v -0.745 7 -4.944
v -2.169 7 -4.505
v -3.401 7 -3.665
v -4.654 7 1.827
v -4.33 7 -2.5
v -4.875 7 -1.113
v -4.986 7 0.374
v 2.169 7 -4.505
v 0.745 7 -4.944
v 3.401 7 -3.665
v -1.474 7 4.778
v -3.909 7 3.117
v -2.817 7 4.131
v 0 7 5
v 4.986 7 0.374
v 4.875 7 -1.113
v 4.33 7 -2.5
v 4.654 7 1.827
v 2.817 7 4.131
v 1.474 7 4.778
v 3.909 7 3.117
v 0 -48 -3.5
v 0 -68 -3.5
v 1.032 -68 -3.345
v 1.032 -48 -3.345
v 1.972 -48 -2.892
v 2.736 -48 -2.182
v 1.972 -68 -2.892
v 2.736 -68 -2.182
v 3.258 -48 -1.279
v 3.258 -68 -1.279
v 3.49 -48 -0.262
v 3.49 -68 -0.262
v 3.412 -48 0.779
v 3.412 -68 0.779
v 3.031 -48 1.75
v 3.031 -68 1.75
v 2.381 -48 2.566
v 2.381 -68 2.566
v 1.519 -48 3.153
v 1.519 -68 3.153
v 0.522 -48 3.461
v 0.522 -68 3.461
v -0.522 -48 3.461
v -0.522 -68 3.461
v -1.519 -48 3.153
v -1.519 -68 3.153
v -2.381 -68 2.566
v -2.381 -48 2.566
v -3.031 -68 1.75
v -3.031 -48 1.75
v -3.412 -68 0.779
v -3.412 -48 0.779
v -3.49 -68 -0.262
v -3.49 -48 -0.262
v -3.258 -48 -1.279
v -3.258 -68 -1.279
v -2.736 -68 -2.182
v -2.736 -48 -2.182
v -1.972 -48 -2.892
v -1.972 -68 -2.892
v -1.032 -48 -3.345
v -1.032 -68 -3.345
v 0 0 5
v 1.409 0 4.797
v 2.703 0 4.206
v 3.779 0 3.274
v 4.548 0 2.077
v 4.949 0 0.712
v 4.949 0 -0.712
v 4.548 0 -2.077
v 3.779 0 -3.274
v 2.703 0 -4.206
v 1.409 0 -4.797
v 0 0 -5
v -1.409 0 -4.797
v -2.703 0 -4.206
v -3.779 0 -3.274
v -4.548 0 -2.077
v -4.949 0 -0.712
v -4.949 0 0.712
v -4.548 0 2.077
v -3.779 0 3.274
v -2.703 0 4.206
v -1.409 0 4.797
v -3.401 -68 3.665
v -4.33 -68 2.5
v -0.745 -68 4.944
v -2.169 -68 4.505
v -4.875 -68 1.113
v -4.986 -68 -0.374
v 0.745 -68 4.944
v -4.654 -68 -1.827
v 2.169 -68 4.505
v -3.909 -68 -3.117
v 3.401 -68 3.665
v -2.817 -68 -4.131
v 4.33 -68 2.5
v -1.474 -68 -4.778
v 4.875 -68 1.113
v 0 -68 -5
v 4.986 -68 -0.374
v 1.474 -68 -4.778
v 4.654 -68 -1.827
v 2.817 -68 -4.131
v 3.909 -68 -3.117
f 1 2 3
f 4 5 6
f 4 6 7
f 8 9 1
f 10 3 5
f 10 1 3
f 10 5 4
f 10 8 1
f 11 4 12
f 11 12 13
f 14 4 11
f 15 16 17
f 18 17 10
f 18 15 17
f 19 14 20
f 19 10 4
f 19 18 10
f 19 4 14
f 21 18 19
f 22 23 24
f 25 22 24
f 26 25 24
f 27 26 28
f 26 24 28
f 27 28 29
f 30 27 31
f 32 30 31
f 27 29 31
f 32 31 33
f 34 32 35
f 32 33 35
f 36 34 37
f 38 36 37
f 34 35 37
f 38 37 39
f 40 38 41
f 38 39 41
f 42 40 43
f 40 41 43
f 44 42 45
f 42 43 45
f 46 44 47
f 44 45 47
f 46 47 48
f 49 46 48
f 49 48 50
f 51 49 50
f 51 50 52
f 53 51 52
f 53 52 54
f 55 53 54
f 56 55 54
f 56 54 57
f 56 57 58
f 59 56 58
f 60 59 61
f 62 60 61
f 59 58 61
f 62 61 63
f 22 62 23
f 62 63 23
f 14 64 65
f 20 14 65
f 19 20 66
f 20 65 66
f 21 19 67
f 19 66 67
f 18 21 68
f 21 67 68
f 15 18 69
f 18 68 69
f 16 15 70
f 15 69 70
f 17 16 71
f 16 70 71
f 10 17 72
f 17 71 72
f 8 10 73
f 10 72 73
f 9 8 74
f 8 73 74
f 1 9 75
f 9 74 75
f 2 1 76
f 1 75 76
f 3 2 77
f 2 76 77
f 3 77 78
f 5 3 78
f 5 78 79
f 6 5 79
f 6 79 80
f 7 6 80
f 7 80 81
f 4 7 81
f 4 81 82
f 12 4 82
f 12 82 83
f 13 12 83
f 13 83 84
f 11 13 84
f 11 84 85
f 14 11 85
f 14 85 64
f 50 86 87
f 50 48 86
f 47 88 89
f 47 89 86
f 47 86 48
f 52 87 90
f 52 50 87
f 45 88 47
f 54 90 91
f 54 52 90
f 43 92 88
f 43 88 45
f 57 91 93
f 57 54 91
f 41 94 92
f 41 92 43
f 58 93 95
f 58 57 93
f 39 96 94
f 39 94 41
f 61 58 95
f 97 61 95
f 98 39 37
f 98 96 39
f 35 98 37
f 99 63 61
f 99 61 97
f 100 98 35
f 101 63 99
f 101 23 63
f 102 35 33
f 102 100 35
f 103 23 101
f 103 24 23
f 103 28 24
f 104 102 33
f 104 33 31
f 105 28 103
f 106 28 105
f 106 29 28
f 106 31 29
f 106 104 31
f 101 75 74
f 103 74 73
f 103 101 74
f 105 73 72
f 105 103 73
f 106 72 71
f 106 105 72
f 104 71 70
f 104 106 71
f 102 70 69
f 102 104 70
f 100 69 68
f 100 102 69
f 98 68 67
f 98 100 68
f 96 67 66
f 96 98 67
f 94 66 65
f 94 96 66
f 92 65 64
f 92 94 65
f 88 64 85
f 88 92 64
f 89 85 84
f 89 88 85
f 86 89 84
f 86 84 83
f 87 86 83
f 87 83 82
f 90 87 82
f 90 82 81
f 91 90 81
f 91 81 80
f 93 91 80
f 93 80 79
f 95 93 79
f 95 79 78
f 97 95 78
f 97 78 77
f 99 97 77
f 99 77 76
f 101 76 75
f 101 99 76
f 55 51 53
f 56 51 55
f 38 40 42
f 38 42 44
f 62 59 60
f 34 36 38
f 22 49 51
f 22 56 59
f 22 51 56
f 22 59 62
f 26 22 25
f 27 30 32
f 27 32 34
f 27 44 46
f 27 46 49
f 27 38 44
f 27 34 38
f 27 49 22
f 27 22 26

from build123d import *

# Parameters (mm, degrees)
SKETCH_1_R          = 5
EXTRUDE_1_DEPTH     = 7
EXTRUDE_START       = 68
SKETCH_2_R          = 5
EXTRUDE_2_DEPTH     = 68
SKETCH_3_R          = 3.5
CUT_EXTRUDE_1_DEPTH = 20


with BuildPart() as part:
    # ｽｹｯﾁ1 → ﾎﾞｽ - 押し出し1 (new body)
    with BuildSketch(Plane(origin=(0, 0, 0), x_dir=(1, 0, 0), z_dir=(0, 1, 0))):
        with Locations(Location((0, 0, 0), (0, 0, 270))):
            Circle(SKETCH_1_R)
    extrude(amount=EXTRUDE_1_DEPTH)

    # ｽｹｯﾁ2 → ﾎﾞｽ - 押し出し2 (add)
    with BuildSketch(Plane.XZ.offset(EXTRUDE_START)):
        with Locations(Location((0, 0, 0), (0, 0, 270))):
            Circle(SKETCH_2_R)
    extrude(amount=-EXTRUDE_2_DEPTH)

    # ｽｹｯﾁ3 → ｶｯﾄ - 押し出し1 (cut)
    with BuildSketch(Plane.XZ.offset(68)):
        with Locations(Location((0, 0, 0), (0, 0, 270))):
            Circle(SKETCH_3_R)
    extrude(amount=-CUT_EXTRUDE_1_DEPTH, mode=Mode.SUBTRACT)


solid = part.part
